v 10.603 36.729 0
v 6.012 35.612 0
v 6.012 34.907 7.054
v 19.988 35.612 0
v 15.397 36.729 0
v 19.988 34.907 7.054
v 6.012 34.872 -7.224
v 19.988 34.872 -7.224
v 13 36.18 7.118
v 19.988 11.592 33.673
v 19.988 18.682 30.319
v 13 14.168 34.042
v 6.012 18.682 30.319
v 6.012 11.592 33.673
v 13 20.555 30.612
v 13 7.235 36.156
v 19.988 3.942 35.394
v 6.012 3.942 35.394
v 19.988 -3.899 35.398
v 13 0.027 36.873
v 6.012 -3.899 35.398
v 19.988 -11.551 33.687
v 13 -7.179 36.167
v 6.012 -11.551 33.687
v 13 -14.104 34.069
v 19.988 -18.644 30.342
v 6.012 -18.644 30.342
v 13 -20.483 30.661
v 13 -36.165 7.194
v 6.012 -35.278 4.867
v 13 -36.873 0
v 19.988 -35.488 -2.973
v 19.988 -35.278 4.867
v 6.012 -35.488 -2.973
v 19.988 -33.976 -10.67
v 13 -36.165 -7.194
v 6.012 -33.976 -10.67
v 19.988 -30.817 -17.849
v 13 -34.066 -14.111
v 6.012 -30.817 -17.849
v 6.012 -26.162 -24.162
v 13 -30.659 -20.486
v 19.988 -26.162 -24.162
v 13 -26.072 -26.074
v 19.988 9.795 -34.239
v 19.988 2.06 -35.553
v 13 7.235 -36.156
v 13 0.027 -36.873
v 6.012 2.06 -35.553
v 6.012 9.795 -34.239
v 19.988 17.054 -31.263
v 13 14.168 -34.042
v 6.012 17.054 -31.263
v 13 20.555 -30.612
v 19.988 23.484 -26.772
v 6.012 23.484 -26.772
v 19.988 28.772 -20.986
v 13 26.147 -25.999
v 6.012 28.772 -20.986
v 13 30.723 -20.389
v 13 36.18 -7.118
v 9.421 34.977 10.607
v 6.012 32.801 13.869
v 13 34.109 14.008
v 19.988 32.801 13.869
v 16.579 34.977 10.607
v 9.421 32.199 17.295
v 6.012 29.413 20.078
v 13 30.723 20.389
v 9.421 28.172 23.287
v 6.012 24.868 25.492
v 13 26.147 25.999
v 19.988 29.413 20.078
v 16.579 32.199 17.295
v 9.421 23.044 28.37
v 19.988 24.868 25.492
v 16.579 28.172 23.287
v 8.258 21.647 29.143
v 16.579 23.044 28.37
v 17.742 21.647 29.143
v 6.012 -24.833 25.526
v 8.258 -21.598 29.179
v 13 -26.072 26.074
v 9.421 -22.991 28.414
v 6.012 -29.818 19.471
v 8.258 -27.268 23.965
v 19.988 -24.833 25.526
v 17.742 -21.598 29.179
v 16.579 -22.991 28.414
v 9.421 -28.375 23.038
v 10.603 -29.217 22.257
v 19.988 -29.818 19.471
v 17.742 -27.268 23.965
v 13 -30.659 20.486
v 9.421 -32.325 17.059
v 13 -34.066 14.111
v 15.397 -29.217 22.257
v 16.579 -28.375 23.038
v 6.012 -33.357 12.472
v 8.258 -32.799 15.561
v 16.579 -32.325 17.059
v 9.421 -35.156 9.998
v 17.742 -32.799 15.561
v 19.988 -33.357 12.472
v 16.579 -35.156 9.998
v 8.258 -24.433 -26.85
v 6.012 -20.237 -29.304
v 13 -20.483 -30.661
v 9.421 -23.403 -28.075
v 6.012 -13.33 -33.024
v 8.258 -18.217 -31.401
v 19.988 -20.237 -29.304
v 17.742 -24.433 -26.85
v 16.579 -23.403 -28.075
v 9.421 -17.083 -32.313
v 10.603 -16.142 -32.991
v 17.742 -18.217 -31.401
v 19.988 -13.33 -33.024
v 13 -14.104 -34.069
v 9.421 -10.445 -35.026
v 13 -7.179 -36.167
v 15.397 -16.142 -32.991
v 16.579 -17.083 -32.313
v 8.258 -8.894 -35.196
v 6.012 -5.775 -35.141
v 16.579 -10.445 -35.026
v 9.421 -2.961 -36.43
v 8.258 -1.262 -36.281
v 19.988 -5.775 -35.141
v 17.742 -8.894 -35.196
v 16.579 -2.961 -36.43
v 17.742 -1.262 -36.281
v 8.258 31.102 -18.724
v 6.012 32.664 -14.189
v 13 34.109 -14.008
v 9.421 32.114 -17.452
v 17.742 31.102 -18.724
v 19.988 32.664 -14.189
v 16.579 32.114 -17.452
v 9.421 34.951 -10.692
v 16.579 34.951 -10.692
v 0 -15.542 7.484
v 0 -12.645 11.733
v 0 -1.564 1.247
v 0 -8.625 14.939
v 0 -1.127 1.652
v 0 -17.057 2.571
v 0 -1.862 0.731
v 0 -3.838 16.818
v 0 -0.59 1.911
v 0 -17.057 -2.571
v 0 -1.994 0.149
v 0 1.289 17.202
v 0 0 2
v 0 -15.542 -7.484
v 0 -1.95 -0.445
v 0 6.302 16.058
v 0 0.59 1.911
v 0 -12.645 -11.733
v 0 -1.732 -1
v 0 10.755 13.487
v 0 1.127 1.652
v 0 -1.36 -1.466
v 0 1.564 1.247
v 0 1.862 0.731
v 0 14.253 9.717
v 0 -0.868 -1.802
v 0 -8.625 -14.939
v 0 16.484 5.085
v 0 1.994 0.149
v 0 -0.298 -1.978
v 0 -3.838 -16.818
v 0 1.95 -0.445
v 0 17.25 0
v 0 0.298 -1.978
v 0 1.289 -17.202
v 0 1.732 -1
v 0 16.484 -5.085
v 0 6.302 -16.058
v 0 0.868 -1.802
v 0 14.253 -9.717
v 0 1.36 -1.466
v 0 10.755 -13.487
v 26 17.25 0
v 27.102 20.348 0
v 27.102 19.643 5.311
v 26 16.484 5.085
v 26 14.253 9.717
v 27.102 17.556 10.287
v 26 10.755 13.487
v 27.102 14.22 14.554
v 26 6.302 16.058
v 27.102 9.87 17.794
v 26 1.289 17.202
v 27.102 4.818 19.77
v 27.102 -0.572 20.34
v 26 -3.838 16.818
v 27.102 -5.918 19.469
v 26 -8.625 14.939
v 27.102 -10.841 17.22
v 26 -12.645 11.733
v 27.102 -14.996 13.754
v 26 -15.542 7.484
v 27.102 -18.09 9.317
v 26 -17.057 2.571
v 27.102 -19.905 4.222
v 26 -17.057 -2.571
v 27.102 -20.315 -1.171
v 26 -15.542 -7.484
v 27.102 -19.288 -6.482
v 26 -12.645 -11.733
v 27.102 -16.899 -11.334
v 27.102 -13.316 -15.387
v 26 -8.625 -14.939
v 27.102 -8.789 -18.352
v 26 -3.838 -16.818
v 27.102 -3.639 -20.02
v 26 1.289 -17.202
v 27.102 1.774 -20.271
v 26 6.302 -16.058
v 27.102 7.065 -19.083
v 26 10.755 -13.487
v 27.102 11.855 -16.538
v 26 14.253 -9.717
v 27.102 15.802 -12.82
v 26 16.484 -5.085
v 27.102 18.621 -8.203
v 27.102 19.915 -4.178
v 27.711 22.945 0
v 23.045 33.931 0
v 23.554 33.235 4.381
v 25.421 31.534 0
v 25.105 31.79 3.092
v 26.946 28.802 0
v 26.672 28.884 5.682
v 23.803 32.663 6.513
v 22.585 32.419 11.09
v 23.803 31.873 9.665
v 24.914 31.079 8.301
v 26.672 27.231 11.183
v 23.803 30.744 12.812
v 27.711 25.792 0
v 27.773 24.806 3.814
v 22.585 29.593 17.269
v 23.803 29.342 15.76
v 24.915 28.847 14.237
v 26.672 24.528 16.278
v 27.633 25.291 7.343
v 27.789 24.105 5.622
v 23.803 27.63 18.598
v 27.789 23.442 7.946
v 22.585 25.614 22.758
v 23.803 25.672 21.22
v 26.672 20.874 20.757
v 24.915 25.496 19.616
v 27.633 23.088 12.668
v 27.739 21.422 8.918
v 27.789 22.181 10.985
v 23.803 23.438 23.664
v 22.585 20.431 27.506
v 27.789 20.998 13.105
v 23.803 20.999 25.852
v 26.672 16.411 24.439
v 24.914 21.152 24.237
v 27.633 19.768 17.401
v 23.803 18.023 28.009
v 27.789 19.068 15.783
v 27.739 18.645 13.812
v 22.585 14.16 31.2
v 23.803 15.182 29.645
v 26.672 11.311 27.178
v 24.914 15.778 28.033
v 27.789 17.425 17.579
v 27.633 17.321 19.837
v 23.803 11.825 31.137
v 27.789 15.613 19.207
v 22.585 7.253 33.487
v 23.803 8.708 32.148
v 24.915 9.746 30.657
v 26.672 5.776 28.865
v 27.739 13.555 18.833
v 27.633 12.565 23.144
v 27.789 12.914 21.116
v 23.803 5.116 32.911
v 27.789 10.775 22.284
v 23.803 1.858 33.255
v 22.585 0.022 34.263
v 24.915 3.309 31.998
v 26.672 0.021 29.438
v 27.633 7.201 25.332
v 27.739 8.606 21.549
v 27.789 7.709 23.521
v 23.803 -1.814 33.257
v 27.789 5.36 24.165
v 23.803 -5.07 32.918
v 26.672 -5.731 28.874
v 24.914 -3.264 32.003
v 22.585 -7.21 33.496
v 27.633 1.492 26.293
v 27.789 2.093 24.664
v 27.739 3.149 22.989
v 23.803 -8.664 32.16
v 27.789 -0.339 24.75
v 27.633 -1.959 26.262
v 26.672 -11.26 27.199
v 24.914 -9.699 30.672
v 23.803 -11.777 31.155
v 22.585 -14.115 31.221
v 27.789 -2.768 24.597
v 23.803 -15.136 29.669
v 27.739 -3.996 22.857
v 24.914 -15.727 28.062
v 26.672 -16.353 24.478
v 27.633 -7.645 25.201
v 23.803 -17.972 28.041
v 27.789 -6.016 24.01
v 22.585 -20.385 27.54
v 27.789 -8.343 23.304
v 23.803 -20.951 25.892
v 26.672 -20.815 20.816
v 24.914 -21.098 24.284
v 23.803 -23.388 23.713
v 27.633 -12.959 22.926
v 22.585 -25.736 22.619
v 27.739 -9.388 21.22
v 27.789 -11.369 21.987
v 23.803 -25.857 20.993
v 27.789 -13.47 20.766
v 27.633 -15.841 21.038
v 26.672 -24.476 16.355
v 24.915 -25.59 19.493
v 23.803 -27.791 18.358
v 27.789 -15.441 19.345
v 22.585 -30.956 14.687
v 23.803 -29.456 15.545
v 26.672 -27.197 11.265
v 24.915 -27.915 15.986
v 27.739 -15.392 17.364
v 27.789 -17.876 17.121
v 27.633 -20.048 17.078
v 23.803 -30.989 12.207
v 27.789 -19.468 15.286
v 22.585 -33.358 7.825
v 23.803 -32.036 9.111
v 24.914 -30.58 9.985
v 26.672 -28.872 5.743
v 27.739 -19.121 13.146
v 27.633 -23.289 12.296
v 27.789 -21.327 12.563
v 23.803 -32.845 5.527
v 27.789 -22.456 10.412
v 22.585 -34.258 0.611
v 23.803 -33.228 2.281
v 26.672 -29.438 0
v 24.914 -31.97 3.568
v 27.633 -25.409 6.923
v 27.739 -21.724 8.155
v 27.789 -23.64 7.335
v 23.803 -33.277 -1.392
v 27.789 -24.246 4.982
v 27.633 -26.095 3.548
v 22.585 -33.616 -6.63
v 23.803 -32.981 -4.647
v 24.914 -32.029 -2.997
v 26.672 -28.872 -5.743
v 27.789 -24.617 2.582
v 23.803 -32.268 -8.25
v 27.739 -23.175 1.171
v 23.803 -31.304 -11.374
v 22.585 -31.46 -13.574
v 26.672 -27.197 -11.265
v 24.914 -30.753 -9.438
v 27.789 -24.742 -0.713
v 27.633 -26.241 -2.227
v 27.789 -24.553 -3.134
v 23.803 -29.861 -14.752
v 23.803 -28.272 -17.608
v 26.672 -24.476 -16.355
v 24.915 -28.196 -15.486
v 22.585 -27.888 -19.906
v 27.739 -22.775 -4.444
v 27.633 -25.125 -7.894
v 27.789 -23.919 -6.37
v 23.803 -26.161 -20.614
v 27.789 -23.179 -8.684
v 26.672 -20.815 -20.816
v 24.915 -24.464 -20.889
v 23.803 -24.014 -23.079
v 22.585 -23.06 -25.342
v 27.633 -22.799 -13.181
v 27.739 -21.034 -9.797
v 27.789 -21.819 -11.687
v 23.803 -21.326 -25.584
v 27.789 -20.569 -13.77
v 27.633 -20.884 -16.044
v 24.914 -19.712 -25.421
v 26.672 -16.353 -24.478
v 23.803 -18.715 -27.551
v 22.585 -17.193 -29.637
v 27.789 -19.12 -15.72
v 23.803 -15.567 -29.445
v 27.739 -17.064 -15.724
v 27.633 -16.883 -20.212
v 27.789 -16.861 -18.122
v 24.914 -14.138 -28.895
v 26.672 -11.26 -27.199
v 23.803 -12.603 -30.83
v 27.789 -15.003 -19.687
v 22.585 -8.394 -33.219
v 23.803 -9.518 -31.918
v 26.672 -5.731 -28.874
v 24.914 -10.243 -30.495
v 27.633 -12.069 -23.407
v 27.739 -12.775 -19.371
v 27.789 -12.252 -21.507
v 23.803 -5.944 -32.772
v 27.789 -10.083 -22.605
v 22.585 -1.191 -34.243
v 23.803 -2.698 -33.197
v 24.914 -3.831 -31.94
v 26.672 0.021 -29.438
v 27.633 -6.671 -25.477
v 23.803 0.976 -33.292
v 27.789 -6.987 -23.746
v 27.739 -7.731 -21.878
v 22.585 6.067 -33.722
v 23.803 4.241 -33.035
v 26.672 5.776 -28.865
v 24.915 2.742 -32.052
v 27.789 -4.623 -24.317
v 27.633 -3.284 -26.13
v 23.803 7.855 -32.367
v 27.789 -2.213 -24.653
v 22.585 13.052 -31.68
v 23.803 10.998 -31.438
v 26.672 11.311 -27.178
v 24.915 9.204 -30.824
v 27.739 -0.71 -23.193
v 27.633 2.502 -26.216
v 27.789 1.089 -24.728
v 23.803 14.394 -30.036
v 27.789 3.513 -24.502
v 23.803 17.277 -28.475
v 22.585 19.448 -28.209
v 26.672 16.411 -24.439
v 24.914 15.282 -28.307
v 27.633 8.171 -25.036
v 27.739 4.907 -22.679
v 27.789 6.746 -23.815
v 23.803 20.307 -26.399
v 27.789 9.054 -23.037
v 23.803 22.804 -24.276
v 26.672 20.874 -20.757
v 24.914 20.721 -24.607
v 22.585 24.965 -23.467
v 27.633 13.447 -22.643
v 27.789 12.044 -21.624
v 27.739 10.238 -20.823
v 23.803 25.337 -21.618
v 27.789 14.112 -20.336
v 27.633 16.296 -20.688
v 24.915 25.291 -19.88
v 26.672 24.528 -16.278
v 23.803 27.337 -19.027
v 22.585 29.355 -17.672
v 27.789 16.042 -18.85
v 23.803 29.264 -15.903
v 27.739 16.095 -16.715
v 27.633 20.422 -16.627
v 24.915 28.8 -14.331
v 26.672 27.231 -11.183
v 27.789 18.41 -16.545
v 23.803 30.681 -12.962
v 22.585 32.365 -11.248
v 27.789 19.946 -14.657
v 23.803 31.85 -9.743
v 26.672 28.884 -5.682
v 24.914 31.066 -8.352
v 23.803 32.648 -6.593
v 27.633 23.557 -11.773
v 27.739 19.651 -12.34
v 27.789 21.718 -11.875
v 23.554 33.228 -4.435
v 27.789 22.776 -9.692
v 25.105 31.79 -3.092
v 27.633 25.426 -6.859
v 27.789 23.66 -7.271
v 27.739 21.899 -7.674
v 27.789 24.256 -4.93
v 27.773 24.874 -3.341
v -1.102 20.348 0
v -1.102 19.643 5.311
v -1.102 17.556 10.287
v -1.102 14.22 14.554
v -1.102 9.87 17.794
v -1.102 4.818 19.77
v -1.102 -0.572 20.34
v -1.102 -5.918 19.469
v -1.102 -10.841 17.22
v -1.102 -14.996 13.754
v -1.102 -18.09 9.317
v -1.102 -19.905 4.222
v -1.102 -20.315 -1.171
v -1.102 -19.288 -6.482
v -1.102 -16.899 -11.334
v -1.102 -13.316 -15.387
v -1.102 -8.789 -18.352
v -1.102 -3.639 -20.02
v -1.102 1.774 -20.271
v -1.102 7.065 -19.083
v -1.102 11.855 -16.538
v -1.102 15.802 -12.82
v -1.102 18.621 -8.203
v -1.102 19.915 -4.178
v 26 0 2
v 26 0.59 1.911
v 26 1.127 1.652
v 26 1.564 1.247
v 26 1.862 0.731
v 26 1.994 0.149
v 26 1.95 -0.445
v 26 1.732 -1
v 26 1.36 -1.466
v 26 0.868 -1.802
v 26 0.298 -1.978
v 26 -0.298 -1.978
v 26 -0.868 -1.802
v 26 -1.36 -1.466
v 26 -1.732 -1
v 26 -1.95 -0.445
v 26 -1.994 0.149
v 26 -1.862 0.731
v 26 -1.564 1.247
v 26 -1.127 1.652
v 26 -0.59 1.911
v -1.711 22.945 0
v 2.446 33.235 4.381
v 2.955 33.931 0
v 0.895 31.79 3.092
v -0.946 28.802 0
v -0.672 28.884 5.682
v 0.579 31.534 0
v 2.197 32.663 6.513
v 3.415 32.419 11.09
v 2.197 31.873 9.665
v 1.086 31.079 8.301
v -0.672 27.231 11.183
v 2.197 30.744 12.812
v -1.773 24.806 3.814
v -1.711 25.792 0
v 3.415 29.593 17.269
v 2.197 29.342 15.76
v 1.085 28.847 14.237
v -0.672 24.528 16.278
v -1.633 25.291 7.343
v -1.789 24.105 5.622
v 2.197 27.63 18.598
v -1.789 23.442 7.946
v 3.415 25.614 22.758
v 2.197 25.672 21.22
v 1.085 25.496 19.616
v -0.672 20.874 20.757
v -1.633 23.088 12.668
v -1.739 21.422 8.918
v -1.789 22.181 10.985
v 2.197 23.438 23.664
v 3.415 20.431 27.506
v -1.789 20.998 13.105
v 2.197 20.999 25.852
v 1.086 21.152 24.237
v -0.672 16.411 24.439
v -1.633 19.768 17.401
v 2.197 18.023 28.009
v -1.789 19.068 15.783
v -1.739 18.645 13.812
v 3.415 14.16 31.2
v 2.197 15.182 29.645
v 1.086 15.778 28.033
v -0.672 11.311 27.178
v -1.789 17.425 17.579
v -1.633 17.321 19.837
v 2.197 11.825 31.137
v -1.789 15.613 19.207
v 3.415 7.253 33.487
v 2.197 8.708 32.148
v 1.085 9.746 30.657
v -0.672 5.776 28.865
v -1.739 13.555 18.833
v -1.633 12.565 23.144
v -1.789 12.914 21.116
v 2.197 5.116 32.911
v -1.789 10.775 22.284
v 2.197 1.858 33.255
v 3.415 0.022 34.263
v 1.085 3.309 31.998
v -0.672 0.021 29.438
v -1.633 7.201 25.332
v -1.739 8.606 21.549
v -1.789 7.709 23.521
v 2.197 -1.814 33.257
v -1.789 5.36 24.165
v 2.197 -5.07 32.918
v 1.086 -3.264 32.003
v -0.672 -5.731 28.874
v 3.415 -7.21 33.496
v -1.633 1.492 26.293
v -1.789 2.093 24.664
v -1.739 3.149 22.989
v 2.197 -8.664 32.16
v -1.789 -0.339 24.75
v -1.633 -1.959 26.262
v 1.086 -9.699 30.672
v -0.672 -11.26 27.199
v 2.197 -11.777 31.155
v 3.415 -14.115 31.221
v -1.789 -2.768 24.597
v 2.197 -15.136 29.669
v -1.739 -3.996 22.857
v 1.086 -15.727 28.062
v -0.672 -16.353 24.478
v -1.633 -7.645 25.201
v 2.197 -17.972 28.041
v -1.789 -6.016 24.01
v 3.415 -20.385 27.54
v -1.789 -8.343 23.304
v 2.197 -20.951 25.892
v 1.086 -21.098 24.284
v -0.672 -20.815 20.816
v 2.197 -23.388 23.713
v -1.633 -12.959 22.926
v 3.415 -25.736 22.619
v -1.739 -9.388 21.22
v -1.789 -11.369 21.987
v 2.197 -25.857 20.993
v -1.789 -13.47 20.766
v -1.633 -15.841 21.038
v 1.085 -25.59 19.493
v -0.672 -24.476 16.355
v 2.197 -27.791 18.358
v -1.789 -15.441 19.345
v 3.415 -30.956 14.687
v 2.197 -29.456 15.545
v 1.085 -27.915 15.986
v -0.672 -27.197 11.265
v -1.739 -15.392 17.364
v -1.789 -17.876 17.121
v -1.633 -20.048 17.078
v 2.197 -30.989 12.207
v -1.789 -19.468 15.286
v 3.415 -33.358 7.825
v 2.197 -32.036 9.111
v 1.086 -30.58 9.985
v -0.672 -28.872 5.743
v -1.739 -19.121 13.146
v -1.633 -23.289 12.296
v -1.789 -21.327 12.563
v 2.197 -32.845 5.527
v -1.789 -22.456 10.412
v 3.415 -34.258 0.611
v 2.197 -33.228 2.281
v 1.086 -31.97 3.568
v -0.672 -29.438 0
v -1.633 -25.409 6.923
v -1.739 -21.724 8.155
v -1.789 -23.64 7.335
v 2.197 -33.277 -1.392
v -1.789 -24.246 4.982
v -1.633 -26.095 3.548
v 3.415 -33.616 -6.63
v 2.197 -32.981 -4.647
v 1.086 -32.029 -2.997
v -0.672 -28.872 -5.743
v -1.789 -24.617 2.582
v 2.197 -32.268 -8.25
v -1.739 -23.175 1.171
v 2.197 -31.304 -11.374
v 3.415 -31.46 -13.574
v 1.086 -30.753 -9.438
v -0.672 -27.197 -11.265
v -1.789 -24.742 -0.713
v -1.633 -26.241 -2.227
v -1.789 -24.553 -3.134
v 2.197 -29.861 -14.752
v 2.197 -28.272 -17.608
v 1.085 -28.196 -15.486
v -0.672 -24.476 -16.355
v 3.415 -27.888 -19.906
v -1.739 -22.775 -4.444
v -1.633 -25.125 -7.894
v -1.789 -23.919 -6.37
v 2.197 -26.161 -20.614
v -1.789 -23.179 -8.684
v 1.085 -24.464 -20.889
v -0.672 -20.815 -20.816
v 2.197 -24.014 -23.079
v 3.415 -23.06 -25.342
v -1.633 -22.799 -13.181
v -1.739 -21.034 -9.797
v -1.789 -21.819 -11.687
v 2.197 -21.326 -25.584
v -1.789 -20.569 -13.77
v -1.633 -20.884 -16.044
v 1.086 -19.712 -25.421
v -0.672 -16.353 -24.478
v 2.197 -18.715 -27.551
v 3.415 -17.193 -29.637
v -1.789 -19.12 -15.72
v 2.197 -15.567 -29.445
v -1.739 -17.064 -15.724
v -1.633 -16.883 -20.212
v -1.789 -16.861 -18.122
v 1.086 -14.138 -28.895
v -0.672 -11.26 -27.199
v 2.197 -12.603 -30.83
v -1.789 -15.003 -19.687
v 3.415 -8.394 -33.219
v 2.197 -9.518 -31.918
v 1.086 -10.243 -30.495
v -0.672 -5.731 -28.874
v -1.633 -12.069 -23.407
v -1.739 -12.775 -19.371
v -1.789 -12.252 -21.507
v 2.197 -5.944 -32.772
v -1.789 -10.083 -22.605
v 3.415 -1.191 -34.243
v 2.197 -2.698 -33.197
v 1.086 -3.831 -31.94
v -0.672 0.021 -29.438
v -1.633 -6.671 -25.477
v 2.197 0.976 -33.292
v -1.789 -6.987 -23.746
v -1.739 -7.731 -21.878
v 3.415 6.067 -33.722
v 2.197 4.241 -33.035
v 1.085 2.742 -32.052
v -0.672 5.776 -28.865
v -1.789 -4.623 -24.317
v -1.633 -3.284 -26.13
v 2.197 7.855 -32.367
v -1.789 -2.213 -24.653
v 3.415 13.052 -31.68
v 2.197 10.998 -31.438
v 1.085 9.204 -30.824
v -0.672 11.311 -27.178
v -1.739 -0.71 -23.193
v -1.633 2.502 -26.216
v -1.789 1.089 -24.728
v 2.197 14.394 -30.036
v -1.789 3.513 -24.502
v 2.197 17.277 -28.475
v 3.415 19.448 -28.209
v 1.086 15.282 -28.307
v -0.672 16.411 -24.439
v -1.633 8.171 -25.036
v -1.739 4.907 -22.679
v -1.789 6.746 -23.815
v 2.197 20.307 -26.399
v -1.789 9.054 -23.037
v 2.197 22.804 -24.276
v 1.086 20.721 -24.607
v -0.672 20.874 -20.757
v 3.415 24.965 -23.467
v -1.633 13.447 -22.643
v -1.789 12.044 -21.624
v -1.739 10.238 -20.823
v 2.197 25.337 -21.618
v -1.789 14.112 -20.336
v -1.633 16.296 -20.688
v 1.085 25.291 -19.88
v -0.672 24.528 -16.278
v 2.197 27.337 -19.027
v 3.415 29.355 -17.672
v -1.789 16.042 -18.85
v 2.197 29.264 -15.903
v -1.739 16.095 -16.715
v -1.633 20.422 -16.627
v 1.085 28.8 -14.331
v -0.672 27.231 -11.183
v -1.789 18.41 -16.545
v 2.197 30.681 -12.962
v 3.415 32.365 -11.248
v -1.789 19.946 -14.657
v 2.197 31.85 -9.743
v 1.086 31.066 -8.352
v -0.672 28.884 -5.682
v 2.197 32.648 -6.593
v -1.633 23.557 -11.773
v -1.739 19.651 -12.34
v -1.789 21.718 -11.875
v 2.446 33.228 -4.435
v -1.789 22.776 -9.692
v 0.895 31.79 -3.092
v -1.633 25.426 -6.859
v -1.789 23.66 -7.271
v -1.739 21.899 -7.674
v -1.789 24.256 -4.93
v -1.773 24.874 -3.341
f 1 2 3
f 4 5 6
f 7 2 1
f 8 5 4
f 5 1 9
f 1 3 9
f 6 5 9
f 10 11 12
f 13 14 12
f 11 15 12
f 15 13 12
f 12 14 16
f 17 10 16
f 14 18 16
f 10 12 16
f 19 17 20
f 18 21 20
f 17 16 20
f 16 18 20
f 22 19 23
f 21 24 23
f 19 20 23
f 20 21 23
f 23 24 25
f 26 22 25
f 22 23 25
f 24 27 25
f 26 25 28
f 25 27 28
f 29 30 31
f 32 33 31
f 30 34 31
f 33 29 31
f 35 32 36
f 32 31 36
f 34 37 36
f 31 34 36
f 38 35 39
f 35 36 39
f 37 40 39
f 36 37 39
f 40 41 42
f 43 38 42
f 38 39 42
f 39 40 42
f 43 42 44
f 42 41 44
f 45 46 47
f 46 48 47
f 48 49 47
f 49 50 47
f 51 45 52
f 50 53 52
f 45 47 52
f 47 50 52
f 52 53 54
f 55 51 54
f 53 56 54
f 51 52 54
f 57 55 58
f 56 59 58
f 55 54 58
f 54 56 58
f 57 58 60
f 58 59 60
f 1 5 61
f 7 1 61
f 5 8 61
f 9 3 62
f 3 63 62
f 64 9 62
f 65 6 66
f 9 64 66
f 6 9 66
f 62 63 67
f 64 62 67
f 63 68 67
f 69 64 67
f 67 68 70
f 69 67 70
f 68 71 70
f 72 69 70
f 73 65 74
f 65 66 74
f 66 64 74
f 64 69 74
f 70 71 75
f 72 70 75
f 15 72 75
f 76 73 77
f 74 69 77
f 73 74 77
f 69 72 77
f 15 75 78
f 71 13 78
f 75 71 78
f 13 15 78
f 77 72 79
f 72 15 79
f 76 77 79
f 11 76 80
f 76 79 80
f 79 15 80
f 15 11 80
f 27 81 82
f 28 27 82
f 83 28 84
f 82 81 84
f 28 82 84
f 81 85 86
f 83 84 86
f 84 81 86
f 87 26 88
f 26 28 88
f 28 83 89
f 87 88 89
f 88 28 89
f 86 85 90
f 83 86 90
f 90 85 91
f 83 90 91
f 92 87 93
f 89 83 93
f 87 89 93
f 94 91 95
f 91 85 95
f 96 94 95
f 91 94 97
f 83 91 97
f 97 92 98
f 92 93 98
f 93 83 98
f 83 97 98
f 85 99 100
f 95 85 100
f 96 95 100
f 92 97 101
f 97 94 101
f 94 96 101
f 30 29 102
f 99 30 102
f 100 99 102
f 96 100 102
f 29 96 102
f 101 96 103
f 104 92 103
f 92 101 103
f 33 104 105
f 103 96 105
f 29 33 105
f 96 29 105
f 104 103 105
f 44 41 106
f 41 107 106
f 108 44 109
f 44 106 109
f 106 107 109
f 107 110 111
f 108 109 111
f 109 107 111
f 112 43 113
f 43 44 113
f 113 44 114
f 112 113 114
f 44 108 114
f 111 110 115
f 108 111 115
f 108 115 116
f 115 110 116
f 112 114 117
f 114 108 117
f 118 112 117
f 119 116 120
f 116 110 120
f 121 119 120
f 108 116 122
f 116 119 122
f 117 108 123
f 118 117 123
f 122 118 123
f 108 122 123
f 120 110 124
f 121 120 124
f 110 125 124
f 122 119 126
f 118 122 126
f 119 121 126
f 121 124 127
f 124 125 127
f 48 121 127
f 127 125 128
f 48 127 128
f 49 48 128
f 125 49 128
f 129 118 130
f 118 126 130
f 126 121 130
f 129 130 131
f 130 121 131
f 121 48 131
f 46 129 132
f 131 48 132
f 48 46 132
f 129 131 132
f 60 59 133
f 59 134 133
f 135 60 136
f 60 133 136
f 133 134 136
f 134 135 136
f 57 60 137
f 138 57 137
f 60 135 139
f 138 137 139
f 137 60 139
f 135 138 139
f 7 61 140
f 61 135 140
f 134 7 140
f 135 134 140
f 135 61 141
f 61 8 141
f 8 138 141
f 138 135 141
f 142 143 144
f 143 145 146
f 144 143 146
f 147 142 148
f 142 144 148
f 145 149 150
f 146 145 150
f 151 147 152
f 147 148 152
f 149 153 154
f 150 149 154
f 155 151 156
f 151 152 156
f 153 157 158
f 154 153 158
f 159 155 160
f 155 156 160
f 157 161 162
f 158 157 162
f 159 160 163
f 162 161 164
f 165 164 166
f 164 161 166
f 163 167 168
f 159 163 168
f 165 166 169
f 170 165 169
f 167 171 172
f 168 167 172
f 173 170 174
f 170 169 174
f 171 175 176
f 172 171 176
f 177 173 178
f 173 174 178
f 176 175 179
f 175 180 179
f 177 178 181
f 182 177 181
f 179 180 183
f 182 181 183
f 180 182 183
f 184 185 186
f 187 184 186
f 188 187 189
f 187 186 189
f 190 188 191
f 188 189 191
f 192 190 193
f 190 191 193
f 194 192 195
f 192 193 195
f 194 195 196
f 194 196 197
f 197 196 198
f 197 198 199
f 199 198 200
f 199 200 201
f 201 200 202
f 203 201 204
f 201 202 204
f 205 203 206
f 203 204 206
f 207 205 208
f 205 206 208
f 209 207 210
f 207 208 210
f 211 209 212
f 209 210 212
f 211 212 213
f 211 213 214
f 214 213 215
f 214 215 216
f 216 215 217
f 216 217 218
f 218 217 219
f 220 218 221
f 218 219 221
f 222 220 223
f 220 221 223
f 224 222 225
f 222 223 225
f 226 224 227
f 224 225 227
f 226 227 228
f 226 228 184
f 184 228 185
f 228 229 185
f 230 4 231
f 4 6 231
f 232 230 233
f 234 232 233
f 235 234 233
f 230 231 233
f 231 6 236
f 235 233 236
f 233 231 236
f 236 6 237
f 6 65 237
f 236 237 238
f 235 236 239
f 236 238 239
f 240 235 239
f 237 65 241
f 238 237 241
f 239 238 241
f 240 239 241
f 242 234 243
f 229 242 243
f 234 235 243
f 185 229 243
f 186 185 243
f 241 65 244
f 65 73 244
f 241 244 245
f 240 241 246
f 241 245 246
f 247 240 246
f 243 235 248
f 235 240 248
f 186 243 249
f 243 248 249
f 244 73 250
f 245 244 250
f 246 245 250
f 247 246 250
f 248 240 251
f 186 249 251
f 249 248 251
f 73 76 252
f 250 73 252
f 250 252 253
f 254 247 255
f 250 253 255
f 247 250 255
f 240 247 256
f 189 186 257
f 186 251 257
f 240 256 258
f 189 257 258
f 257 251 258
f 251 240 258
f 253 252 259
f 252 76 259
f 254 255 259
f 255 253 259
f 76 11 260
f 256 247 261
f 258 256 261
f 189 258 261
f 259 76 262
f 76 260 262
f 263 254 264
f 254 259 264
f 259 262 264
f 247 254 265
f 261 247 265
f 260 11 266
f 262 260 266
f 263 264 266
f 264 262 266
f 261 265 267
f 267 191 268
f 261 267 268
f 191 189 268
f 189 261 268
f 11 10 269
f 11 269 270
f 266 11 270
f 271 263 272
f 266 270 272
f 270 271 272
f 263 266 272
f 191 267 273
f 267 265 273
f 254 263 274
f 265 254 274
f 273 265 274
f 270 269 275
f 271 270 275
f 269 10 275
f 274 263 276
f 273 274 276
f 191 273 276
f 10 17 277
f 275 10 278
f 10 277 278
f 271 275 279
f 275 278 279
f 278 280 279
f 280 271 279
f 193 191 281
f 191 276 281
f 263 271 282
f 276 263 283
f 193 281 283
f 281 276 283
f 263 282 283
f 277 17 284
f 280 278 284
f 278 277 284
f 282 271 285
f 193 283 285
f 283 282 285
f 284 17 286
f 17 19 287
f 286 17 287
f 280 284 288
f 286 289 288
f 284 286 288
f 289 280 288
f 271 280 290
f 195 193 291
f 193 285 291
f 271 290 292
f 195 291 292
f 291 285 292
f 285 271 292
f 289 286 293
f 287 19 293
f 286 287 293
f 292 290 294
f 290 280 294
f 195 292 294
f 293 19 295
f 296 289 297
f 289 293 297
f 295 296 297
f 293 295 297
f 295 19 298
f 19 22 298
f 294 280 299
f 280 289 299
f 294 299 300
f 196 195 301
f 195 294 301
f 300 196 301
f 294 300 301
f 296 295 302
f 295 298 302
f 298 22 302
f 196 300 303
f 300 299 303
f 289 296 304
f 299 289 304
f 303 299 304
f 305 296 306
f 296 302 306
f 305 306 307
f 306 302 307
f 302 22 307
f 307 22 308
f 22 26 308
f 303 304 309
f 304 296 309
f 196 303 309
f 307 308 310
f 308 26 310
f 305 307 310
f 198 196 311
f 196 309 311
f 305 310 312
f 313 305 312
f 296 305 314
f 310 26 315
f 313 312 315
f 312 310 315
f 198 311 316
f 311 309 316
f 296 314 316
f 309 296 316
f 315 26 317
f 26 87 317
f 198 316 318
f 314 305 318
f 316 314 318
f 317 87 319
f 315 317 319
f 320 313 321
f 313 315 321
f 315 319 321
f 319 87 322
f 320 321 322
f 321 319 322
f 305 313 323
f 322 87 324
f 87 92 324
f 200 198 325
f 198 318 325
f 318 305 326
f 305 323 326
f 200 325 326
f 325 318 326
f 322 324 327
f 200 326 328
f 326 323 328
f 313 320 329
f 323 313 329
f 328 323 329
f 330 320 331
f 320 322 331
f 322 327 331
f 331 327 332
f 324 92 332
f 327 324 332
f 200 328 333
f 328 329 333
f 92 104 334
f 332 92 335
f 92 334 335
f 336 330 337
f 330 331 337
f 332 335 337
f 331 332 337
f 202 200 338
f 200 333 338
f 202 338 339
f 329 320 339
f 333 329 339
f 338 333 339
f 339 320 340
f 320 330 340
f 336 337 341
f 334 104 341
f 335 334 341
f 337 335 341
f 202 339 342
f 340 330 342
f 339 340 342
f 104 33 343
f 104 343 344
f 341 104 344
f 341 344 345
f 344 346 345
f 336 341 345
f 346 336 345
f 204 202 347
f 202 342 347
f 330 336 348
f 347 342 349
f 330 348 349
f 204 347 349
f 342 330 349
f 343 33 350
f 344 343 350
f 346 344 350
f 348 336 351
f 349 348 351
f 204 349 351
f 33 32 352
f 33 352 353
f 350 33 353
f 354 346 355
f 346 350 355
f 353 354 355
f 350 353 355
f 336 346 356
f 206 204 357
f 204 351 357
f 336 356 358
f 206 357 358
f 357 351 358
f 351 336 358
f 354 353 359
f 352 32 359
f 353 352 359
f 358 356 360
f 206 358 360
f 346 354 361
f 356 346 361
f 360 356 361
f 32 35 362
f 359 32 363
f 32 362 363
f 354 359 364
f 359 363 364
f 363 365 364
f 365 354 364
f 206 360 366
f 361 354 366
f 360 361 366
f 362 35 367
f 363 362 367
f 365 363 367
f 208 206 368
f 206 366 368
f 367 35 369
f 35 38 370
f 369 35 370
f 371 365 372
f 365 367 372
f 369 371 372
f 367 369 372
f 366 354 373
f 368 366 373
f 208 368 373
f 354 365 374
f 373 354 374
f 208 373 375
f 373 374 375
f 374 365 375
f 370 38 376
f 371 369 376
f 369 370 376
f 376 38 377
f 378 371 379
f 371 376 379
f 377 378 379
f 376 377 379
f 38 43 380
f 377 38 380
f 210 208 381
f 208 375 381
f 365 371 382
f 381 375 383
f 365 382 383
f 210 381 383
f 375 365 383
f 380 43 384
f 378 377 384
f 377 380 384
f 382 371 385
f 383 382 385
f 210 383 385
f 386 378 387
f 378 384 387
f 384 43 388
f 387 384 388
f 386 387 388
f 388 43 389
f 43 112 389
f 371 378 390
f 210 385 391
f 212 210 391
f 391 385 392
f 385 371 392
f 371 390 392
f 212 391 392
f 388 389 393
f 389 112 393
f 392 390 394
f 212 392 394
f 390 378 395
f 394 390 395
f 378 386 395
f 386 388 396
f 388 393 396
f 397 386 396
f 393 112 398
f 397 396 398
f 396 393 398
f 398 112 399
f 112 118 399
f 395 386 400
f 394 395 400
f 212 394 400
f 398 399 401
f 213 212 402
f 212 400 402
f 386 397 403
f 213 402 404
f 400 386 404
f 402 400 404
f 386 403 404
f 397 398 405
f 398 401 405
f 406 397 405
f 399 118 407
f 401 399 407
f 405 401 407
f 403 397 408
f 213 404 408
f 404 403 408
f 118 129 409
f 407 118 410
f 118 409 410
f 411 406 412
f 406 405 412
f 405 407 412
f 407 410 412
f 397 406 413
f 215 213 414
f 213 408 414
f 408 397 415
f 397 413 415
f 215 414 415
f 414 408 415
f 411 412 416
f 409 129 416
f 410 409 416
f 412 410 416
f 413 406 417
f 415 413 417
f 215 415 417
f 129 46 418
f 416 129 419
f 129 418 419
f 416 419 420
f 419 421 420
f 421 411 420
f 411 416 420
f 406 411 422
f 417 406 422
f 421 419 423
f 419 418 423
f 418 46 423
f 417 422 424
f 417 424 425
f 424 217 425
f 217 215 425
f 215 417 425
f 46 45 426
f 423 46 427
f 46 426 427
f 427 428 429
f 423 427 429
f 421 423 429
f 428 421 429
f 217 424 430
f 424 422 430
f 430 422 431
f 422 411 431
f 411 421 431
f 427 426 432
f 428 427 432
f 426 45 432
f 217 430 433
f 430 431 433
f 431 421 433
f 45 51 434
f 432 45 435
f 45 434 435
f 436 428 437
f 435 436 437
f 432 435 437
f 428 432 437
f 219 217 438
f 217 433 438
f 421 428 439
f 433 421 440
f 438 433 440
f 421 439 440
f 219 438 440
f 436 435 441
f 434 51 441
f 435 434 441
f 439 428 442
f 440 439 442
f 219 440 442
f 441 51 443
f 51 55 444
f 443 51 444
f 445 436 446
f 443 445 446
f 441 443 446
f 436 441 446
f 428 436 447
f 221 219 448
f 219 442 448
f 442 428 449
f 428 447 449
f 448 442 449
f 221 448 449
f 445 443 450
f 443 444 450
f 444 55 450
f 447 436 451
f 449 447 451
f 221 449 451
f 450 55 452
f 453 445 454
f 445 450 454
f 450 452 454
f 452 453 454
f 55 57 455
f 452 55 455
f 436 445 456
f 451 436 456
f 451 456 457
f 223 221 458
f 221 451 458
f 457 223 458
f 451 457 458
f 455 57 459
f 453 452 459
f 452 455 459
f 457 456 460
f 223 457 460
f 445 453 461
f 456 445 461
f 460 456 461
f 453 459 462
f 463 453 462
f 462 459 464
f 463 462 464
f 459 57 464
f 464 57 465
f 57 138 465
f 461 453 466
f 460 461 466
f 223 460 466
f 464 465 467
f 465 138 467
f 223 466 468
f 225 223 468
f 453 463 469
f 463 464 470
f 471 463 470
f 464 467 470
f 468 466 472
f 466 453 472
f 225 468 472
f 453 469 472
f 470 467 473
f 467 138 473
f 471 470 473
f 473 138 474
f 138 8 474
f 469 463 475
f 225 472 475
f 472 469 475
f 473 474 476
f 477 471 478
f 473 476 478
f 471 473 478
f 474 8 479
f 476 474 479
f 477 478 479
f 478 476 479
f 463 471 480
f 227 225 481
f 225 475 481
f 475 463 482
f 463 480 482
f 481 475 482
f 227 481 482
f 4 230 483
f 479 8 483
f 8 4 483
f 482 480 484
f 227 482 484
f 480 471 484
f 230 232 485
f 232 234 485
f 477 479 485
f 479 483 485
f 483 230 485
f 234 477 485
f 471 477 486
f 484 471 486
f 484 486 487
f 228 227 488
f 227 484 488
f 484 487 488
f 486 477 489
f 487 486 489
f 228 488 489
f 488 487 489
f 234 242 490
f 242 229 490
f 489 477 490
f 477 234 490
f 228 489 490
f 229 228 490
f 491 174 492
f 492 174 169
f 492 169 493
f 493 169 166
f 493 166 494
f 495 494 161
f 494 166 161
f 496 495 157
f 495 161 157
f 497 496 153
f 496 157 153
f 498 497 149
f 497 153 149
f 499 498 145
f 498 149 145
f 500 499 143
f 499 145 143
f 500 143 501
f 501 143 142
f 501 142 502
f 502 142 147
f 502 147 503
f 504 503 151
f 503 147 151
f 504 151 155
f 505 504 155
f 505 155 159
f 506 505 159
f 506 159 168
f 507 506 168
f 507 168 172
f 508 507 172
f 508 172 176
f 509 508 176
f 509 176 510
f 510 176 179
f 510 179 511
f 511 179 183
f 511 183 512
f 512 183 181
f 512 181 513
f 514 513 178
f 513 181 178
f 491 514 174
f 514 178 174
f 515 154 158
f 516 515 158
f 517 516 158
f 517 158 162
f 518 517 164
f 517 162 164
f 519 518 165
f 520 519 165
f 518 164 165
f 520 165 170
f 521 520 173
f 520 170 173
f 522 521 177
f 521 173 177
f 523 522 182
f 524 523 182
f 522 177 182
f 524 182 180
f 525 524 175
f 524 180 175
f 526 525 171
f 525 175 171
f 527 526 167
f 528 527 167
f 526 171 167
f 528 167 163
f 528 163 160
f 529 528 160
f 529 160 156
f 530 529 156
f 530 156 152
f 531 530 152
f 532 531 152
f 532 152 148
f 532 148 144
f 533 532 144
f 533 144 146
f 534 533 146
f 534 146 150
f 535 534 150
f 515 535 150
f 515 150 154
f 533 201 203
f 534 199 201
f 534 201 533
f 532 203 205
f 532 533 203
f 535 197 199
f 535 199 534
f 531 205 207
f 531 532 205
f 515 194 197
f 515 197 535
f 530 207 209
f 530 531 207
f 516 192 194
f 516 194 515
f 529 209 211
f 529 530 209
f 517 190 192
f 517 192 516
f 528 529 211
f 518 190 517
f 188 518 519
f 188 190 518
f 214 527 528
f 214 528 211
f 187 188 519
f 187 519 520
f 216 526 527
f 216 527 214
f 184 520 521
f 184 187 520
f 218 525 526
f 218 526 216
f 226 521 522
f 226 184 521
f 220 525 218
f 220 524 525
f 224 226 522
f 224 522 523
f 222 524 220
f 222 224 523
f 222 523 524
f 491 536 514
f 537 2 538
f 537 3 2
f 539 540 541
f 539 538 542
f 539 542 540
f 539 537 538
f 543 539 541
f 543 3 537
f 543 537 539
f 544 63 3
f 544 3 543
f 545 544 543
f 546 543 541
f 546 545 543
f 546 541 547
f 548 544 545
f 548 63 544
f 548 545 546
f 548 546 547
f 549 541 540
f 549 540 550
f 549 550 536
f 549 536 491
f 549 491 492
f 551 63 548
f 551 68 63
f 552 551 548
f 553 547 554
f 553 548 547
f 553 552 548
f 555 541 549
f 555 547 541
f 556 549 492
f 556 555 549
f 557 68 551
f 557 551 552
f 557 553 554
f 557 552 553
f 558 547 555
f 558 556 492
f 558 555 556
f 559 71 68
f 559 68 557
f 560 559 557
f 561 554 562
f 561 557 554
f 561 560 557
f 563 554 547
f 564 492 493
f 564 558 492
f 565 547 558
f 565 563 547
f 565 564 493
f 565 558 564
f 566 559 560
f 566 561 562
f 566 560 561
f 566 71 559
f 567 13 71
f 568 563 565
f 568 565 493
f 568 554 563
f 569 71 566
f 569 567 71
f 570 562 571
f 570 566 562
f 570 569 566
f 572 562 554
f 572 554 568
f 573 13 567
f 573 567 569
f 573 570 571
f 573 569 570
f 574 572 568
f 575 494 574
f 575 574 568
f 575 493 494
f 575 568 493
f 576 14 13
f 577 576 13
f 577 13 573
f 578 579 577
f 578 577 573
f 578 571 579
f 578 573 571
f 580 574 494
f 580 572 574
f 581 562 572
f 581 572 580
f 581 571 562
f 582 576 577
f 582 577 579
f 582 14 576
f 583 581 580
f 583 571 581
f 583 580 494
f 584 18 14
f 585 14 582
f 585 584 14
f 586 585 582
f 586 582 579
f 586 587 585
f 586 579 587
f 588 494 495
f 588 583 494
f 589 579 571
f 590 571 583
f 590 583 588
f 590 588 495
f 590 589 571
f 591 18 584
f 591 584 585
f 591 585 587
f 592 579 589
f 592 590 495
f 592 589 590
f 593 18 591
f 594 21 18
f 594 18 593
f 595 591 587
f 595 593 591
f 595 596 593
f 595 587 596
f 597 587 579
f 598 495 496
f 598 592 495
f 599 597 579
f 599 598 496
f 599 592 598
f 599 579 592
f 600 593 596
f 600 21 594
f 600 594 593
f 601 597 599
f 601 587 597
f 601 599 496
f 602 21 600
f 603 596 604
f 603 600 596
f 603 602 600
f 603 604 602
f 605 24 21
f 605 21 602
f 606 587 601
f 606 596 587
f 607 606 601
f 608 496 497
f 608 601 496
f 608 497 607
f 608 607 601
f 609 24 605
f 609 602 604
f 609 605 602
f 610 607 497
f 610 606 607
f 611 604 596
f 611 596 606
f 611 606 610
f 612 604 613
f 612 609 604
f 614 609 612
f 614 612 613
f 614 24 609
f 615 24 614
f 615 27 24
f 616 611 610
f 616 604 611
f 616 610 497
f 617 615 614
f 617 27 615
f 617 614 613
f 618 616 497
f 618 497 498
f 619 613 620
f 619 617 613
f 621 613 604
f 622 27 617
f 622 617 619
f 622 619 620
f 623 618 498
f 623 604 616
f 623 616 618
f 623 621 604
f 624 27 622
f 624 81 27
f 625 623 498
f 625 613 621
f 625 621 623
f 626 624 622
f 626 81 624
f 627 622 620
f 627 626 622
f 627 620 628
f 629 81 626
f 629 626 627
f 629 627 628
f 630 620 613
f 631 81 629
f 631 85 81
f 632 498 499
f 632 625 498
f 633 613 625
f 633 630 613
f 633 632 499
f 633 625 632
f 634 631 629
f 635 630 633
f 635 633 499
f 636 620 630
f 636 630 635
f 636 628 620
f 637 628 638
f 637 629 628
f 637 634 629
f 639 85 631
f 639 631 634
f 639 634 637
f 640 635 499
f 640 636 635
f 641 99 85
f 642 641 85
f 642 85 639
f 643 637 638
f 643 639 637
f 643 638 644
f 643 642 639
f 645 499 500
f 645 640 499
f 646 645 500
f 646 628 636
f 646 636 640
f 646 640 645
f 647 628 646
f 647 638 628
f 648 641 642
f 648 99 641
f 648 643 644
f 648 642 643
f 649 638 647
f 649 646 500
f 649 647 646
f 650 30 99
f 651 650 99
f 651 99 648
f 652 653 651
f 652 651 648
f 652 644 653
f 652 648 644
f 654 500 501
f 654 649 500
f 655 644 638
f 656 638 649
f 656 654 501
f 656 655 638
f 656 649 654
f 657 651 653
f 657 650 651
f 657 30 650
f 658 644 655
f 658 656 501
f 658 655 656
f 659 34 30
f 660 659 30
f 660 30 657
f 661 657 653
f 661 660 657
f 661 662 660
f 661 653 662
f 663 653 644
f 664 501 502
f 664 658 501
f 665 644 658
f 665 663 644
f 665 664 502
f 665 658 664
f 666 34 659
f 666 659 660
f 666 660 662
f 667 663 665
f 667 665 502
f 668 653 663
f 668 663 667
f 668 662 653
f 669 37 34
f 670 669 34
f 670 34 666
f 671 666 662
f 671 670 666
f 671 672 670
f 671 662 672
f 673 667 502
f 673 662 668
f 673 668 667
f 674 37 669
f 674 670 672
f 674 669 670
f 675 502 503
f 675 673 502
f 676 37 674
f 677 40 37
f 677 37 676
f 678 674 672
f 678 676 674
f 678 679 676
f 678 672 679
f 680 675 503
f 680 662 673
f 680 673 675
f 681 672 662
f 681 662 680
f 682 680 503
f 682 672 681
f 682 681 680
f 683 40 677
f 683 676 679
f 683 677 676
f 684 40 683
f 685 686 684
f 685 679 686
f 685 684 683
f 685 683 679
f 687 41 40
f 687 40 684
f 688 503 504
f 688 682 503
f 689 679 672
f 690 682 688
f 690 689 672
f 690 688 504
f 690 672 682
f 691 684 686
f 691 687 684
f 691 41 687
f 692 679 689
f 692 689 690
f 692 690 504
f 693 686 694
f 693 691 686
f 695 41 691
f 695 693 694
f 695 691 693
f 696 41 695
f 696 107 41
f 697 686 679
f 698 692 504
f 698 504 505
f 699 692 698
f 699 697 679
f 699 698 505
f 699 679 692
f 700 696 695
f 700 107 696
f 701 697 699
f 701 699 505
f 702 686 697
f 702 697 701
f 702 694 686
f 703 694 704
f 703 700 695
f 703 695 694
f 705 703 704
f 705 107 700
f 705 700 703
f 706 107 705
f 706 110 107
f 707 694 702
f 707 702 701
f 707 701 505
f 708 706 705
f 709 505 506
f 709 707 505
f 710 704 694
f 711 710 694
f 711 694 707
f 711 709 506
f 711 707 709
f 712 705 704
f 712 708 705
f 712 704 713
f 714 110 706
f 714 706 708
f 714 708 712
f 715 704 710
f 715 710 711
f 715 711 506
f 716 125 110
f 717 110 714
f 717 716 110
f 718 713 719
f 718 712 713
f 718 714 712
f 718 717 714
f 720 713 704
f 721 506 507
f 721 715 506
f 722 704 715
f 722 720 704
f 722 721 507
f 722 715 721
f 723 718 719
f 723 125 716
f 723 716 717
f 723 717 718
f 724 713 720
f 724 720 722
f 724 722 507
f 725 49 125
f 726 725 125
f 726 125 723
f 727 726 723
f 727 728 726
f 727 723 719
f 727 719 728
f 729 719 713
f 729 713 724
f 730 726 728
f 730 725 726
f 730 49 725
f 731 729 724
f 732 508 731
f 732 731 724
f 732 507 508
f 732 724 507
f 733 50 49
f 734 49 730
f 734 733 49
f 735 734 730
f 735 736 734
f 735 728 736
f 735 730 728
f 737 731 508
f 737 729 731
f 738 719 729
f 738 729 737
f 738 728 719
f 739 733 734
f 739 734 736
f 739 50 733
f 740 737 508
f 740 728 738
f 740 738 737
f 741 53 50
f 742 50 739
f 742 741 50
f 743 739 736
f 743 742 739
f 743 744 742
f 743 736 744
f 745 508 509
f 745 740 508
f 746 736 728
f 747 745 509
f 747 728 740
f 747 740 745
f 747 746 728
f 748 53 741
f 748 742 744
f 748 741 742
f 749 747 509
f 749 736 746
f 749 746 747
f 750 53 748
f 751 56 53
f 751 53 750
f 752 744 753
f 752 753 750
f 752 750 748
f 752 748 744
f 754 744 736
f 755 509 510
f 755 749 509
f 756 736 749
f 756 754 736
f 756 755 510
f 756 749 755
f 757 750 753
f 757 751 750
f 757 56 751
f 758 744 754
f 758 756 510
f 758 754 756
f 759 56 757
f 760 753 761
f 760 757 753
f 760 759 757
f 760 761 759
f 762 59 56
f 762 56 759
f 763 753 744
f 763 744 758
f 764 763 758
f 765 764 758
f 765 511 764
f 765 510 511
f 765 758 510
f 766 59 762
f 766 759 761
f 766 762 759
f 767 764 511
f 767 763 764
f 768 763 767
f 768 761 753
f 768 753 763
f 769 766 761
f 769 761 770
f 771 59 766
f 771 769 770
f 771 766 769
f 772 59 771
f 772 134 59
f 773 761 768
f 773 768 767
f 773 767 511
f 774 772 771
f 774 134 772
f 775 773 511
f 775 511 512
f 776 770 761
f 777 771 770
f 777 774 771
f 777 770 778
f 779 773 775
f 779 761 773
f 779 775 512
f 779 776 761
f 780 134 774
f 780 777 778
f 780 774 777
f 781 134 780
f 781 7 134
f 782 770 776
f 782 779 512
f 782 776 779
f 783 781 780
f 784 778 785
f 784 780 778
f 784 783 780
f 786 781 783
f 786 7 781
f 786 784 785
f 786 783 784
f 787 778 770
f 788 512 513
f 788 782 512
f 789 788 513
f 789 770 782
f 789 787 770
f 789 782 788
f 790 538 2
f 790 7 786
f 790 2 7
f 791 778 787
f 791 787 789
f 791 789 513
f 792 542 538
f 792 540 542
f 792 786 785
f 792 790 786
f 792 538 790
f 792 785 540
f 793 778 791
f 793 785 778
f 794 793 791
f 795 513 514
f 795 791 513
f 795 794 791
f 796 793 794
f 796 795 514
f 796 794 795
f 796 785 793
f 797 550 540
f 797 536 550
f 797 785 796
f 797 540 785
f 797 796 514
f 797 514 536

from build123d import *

# Parameters (mm, degrees)
SKETCH1_R               = 17.25
BOSS_EXTRUDE1_DEPTH     = 26
FILLET1_R               = 20
FILLET2_R               = 12
SKETCH3_R               = 2
CUT_EXTRUDE1_DEPTH      = 2.795288953
CUT_EXTRUDE1_DEPTH_BACK = 28.795288953


with BuildPart() as part:
    # Sketch1 → Boss-Extrude1 (new body)
    with BuildSketch(Plane(origin=(0, 0, 0), x_dir=(0, 0, -1), z_dir=(1, 0, 0))):
        Circle(SKETCH1_R)
    extrude(amount=BOSS_EXTRUDE1_DEPTH)

    # Sketch2 → Revolve1 (revolve)
    with BuildSketch(Plane.XY):
        with BuildLine():
            Line((-4.622703996, 30.25), (0, 17.25))
            Line((0, 17.25), (26, 17.25))
            Line((26, 17.25), (30.622703996, 30.25))
            ThreePointArc((30.622703996, 30.25), (22.131370856, 34.751946348), (13, 37.75))
            ThreePointArc((13, 37.75), (3.868629144, 34.751946348), (-4.622703996, 30.25))
        make_face()
    revolve(axis=Axis((0, 0, 0), (1, 0, 0)))

    # Fillet1
    fillet1_edges = [part.edges().sort_by_distance(p)[0] for p in [
        (13, -37.75, 0),
    ]]
    fillet(fillet1_edges, radius=FILLET1_R)

    # Fillet2
    fillet2_edges = [part.edges().sort_by_distance(p)[0] for p in [
        (-4.622703996, -30.25, 0),
        (30.622703996, -30.25, 0),
    ]]
    fillet(fillet2_edges, radius=FILLET2_R)

    # Sketch3 → Cut-Extrude1 (cut, two sides)
    with BuildSketch(Plane.ZY) as cut_extrude1_sk:
        Circle(SKETCH3_R)
    extrude(amount=CUT_EXTRUDE1_DEPTH, mode=Mode.SUBTRACT)
    extrude(cut_extrude1_sk.sketch, amount=-CUT_EXTRUDE1_DEPTH_BACK, mode=Mode.SUBTRACT)


solid = part.part
